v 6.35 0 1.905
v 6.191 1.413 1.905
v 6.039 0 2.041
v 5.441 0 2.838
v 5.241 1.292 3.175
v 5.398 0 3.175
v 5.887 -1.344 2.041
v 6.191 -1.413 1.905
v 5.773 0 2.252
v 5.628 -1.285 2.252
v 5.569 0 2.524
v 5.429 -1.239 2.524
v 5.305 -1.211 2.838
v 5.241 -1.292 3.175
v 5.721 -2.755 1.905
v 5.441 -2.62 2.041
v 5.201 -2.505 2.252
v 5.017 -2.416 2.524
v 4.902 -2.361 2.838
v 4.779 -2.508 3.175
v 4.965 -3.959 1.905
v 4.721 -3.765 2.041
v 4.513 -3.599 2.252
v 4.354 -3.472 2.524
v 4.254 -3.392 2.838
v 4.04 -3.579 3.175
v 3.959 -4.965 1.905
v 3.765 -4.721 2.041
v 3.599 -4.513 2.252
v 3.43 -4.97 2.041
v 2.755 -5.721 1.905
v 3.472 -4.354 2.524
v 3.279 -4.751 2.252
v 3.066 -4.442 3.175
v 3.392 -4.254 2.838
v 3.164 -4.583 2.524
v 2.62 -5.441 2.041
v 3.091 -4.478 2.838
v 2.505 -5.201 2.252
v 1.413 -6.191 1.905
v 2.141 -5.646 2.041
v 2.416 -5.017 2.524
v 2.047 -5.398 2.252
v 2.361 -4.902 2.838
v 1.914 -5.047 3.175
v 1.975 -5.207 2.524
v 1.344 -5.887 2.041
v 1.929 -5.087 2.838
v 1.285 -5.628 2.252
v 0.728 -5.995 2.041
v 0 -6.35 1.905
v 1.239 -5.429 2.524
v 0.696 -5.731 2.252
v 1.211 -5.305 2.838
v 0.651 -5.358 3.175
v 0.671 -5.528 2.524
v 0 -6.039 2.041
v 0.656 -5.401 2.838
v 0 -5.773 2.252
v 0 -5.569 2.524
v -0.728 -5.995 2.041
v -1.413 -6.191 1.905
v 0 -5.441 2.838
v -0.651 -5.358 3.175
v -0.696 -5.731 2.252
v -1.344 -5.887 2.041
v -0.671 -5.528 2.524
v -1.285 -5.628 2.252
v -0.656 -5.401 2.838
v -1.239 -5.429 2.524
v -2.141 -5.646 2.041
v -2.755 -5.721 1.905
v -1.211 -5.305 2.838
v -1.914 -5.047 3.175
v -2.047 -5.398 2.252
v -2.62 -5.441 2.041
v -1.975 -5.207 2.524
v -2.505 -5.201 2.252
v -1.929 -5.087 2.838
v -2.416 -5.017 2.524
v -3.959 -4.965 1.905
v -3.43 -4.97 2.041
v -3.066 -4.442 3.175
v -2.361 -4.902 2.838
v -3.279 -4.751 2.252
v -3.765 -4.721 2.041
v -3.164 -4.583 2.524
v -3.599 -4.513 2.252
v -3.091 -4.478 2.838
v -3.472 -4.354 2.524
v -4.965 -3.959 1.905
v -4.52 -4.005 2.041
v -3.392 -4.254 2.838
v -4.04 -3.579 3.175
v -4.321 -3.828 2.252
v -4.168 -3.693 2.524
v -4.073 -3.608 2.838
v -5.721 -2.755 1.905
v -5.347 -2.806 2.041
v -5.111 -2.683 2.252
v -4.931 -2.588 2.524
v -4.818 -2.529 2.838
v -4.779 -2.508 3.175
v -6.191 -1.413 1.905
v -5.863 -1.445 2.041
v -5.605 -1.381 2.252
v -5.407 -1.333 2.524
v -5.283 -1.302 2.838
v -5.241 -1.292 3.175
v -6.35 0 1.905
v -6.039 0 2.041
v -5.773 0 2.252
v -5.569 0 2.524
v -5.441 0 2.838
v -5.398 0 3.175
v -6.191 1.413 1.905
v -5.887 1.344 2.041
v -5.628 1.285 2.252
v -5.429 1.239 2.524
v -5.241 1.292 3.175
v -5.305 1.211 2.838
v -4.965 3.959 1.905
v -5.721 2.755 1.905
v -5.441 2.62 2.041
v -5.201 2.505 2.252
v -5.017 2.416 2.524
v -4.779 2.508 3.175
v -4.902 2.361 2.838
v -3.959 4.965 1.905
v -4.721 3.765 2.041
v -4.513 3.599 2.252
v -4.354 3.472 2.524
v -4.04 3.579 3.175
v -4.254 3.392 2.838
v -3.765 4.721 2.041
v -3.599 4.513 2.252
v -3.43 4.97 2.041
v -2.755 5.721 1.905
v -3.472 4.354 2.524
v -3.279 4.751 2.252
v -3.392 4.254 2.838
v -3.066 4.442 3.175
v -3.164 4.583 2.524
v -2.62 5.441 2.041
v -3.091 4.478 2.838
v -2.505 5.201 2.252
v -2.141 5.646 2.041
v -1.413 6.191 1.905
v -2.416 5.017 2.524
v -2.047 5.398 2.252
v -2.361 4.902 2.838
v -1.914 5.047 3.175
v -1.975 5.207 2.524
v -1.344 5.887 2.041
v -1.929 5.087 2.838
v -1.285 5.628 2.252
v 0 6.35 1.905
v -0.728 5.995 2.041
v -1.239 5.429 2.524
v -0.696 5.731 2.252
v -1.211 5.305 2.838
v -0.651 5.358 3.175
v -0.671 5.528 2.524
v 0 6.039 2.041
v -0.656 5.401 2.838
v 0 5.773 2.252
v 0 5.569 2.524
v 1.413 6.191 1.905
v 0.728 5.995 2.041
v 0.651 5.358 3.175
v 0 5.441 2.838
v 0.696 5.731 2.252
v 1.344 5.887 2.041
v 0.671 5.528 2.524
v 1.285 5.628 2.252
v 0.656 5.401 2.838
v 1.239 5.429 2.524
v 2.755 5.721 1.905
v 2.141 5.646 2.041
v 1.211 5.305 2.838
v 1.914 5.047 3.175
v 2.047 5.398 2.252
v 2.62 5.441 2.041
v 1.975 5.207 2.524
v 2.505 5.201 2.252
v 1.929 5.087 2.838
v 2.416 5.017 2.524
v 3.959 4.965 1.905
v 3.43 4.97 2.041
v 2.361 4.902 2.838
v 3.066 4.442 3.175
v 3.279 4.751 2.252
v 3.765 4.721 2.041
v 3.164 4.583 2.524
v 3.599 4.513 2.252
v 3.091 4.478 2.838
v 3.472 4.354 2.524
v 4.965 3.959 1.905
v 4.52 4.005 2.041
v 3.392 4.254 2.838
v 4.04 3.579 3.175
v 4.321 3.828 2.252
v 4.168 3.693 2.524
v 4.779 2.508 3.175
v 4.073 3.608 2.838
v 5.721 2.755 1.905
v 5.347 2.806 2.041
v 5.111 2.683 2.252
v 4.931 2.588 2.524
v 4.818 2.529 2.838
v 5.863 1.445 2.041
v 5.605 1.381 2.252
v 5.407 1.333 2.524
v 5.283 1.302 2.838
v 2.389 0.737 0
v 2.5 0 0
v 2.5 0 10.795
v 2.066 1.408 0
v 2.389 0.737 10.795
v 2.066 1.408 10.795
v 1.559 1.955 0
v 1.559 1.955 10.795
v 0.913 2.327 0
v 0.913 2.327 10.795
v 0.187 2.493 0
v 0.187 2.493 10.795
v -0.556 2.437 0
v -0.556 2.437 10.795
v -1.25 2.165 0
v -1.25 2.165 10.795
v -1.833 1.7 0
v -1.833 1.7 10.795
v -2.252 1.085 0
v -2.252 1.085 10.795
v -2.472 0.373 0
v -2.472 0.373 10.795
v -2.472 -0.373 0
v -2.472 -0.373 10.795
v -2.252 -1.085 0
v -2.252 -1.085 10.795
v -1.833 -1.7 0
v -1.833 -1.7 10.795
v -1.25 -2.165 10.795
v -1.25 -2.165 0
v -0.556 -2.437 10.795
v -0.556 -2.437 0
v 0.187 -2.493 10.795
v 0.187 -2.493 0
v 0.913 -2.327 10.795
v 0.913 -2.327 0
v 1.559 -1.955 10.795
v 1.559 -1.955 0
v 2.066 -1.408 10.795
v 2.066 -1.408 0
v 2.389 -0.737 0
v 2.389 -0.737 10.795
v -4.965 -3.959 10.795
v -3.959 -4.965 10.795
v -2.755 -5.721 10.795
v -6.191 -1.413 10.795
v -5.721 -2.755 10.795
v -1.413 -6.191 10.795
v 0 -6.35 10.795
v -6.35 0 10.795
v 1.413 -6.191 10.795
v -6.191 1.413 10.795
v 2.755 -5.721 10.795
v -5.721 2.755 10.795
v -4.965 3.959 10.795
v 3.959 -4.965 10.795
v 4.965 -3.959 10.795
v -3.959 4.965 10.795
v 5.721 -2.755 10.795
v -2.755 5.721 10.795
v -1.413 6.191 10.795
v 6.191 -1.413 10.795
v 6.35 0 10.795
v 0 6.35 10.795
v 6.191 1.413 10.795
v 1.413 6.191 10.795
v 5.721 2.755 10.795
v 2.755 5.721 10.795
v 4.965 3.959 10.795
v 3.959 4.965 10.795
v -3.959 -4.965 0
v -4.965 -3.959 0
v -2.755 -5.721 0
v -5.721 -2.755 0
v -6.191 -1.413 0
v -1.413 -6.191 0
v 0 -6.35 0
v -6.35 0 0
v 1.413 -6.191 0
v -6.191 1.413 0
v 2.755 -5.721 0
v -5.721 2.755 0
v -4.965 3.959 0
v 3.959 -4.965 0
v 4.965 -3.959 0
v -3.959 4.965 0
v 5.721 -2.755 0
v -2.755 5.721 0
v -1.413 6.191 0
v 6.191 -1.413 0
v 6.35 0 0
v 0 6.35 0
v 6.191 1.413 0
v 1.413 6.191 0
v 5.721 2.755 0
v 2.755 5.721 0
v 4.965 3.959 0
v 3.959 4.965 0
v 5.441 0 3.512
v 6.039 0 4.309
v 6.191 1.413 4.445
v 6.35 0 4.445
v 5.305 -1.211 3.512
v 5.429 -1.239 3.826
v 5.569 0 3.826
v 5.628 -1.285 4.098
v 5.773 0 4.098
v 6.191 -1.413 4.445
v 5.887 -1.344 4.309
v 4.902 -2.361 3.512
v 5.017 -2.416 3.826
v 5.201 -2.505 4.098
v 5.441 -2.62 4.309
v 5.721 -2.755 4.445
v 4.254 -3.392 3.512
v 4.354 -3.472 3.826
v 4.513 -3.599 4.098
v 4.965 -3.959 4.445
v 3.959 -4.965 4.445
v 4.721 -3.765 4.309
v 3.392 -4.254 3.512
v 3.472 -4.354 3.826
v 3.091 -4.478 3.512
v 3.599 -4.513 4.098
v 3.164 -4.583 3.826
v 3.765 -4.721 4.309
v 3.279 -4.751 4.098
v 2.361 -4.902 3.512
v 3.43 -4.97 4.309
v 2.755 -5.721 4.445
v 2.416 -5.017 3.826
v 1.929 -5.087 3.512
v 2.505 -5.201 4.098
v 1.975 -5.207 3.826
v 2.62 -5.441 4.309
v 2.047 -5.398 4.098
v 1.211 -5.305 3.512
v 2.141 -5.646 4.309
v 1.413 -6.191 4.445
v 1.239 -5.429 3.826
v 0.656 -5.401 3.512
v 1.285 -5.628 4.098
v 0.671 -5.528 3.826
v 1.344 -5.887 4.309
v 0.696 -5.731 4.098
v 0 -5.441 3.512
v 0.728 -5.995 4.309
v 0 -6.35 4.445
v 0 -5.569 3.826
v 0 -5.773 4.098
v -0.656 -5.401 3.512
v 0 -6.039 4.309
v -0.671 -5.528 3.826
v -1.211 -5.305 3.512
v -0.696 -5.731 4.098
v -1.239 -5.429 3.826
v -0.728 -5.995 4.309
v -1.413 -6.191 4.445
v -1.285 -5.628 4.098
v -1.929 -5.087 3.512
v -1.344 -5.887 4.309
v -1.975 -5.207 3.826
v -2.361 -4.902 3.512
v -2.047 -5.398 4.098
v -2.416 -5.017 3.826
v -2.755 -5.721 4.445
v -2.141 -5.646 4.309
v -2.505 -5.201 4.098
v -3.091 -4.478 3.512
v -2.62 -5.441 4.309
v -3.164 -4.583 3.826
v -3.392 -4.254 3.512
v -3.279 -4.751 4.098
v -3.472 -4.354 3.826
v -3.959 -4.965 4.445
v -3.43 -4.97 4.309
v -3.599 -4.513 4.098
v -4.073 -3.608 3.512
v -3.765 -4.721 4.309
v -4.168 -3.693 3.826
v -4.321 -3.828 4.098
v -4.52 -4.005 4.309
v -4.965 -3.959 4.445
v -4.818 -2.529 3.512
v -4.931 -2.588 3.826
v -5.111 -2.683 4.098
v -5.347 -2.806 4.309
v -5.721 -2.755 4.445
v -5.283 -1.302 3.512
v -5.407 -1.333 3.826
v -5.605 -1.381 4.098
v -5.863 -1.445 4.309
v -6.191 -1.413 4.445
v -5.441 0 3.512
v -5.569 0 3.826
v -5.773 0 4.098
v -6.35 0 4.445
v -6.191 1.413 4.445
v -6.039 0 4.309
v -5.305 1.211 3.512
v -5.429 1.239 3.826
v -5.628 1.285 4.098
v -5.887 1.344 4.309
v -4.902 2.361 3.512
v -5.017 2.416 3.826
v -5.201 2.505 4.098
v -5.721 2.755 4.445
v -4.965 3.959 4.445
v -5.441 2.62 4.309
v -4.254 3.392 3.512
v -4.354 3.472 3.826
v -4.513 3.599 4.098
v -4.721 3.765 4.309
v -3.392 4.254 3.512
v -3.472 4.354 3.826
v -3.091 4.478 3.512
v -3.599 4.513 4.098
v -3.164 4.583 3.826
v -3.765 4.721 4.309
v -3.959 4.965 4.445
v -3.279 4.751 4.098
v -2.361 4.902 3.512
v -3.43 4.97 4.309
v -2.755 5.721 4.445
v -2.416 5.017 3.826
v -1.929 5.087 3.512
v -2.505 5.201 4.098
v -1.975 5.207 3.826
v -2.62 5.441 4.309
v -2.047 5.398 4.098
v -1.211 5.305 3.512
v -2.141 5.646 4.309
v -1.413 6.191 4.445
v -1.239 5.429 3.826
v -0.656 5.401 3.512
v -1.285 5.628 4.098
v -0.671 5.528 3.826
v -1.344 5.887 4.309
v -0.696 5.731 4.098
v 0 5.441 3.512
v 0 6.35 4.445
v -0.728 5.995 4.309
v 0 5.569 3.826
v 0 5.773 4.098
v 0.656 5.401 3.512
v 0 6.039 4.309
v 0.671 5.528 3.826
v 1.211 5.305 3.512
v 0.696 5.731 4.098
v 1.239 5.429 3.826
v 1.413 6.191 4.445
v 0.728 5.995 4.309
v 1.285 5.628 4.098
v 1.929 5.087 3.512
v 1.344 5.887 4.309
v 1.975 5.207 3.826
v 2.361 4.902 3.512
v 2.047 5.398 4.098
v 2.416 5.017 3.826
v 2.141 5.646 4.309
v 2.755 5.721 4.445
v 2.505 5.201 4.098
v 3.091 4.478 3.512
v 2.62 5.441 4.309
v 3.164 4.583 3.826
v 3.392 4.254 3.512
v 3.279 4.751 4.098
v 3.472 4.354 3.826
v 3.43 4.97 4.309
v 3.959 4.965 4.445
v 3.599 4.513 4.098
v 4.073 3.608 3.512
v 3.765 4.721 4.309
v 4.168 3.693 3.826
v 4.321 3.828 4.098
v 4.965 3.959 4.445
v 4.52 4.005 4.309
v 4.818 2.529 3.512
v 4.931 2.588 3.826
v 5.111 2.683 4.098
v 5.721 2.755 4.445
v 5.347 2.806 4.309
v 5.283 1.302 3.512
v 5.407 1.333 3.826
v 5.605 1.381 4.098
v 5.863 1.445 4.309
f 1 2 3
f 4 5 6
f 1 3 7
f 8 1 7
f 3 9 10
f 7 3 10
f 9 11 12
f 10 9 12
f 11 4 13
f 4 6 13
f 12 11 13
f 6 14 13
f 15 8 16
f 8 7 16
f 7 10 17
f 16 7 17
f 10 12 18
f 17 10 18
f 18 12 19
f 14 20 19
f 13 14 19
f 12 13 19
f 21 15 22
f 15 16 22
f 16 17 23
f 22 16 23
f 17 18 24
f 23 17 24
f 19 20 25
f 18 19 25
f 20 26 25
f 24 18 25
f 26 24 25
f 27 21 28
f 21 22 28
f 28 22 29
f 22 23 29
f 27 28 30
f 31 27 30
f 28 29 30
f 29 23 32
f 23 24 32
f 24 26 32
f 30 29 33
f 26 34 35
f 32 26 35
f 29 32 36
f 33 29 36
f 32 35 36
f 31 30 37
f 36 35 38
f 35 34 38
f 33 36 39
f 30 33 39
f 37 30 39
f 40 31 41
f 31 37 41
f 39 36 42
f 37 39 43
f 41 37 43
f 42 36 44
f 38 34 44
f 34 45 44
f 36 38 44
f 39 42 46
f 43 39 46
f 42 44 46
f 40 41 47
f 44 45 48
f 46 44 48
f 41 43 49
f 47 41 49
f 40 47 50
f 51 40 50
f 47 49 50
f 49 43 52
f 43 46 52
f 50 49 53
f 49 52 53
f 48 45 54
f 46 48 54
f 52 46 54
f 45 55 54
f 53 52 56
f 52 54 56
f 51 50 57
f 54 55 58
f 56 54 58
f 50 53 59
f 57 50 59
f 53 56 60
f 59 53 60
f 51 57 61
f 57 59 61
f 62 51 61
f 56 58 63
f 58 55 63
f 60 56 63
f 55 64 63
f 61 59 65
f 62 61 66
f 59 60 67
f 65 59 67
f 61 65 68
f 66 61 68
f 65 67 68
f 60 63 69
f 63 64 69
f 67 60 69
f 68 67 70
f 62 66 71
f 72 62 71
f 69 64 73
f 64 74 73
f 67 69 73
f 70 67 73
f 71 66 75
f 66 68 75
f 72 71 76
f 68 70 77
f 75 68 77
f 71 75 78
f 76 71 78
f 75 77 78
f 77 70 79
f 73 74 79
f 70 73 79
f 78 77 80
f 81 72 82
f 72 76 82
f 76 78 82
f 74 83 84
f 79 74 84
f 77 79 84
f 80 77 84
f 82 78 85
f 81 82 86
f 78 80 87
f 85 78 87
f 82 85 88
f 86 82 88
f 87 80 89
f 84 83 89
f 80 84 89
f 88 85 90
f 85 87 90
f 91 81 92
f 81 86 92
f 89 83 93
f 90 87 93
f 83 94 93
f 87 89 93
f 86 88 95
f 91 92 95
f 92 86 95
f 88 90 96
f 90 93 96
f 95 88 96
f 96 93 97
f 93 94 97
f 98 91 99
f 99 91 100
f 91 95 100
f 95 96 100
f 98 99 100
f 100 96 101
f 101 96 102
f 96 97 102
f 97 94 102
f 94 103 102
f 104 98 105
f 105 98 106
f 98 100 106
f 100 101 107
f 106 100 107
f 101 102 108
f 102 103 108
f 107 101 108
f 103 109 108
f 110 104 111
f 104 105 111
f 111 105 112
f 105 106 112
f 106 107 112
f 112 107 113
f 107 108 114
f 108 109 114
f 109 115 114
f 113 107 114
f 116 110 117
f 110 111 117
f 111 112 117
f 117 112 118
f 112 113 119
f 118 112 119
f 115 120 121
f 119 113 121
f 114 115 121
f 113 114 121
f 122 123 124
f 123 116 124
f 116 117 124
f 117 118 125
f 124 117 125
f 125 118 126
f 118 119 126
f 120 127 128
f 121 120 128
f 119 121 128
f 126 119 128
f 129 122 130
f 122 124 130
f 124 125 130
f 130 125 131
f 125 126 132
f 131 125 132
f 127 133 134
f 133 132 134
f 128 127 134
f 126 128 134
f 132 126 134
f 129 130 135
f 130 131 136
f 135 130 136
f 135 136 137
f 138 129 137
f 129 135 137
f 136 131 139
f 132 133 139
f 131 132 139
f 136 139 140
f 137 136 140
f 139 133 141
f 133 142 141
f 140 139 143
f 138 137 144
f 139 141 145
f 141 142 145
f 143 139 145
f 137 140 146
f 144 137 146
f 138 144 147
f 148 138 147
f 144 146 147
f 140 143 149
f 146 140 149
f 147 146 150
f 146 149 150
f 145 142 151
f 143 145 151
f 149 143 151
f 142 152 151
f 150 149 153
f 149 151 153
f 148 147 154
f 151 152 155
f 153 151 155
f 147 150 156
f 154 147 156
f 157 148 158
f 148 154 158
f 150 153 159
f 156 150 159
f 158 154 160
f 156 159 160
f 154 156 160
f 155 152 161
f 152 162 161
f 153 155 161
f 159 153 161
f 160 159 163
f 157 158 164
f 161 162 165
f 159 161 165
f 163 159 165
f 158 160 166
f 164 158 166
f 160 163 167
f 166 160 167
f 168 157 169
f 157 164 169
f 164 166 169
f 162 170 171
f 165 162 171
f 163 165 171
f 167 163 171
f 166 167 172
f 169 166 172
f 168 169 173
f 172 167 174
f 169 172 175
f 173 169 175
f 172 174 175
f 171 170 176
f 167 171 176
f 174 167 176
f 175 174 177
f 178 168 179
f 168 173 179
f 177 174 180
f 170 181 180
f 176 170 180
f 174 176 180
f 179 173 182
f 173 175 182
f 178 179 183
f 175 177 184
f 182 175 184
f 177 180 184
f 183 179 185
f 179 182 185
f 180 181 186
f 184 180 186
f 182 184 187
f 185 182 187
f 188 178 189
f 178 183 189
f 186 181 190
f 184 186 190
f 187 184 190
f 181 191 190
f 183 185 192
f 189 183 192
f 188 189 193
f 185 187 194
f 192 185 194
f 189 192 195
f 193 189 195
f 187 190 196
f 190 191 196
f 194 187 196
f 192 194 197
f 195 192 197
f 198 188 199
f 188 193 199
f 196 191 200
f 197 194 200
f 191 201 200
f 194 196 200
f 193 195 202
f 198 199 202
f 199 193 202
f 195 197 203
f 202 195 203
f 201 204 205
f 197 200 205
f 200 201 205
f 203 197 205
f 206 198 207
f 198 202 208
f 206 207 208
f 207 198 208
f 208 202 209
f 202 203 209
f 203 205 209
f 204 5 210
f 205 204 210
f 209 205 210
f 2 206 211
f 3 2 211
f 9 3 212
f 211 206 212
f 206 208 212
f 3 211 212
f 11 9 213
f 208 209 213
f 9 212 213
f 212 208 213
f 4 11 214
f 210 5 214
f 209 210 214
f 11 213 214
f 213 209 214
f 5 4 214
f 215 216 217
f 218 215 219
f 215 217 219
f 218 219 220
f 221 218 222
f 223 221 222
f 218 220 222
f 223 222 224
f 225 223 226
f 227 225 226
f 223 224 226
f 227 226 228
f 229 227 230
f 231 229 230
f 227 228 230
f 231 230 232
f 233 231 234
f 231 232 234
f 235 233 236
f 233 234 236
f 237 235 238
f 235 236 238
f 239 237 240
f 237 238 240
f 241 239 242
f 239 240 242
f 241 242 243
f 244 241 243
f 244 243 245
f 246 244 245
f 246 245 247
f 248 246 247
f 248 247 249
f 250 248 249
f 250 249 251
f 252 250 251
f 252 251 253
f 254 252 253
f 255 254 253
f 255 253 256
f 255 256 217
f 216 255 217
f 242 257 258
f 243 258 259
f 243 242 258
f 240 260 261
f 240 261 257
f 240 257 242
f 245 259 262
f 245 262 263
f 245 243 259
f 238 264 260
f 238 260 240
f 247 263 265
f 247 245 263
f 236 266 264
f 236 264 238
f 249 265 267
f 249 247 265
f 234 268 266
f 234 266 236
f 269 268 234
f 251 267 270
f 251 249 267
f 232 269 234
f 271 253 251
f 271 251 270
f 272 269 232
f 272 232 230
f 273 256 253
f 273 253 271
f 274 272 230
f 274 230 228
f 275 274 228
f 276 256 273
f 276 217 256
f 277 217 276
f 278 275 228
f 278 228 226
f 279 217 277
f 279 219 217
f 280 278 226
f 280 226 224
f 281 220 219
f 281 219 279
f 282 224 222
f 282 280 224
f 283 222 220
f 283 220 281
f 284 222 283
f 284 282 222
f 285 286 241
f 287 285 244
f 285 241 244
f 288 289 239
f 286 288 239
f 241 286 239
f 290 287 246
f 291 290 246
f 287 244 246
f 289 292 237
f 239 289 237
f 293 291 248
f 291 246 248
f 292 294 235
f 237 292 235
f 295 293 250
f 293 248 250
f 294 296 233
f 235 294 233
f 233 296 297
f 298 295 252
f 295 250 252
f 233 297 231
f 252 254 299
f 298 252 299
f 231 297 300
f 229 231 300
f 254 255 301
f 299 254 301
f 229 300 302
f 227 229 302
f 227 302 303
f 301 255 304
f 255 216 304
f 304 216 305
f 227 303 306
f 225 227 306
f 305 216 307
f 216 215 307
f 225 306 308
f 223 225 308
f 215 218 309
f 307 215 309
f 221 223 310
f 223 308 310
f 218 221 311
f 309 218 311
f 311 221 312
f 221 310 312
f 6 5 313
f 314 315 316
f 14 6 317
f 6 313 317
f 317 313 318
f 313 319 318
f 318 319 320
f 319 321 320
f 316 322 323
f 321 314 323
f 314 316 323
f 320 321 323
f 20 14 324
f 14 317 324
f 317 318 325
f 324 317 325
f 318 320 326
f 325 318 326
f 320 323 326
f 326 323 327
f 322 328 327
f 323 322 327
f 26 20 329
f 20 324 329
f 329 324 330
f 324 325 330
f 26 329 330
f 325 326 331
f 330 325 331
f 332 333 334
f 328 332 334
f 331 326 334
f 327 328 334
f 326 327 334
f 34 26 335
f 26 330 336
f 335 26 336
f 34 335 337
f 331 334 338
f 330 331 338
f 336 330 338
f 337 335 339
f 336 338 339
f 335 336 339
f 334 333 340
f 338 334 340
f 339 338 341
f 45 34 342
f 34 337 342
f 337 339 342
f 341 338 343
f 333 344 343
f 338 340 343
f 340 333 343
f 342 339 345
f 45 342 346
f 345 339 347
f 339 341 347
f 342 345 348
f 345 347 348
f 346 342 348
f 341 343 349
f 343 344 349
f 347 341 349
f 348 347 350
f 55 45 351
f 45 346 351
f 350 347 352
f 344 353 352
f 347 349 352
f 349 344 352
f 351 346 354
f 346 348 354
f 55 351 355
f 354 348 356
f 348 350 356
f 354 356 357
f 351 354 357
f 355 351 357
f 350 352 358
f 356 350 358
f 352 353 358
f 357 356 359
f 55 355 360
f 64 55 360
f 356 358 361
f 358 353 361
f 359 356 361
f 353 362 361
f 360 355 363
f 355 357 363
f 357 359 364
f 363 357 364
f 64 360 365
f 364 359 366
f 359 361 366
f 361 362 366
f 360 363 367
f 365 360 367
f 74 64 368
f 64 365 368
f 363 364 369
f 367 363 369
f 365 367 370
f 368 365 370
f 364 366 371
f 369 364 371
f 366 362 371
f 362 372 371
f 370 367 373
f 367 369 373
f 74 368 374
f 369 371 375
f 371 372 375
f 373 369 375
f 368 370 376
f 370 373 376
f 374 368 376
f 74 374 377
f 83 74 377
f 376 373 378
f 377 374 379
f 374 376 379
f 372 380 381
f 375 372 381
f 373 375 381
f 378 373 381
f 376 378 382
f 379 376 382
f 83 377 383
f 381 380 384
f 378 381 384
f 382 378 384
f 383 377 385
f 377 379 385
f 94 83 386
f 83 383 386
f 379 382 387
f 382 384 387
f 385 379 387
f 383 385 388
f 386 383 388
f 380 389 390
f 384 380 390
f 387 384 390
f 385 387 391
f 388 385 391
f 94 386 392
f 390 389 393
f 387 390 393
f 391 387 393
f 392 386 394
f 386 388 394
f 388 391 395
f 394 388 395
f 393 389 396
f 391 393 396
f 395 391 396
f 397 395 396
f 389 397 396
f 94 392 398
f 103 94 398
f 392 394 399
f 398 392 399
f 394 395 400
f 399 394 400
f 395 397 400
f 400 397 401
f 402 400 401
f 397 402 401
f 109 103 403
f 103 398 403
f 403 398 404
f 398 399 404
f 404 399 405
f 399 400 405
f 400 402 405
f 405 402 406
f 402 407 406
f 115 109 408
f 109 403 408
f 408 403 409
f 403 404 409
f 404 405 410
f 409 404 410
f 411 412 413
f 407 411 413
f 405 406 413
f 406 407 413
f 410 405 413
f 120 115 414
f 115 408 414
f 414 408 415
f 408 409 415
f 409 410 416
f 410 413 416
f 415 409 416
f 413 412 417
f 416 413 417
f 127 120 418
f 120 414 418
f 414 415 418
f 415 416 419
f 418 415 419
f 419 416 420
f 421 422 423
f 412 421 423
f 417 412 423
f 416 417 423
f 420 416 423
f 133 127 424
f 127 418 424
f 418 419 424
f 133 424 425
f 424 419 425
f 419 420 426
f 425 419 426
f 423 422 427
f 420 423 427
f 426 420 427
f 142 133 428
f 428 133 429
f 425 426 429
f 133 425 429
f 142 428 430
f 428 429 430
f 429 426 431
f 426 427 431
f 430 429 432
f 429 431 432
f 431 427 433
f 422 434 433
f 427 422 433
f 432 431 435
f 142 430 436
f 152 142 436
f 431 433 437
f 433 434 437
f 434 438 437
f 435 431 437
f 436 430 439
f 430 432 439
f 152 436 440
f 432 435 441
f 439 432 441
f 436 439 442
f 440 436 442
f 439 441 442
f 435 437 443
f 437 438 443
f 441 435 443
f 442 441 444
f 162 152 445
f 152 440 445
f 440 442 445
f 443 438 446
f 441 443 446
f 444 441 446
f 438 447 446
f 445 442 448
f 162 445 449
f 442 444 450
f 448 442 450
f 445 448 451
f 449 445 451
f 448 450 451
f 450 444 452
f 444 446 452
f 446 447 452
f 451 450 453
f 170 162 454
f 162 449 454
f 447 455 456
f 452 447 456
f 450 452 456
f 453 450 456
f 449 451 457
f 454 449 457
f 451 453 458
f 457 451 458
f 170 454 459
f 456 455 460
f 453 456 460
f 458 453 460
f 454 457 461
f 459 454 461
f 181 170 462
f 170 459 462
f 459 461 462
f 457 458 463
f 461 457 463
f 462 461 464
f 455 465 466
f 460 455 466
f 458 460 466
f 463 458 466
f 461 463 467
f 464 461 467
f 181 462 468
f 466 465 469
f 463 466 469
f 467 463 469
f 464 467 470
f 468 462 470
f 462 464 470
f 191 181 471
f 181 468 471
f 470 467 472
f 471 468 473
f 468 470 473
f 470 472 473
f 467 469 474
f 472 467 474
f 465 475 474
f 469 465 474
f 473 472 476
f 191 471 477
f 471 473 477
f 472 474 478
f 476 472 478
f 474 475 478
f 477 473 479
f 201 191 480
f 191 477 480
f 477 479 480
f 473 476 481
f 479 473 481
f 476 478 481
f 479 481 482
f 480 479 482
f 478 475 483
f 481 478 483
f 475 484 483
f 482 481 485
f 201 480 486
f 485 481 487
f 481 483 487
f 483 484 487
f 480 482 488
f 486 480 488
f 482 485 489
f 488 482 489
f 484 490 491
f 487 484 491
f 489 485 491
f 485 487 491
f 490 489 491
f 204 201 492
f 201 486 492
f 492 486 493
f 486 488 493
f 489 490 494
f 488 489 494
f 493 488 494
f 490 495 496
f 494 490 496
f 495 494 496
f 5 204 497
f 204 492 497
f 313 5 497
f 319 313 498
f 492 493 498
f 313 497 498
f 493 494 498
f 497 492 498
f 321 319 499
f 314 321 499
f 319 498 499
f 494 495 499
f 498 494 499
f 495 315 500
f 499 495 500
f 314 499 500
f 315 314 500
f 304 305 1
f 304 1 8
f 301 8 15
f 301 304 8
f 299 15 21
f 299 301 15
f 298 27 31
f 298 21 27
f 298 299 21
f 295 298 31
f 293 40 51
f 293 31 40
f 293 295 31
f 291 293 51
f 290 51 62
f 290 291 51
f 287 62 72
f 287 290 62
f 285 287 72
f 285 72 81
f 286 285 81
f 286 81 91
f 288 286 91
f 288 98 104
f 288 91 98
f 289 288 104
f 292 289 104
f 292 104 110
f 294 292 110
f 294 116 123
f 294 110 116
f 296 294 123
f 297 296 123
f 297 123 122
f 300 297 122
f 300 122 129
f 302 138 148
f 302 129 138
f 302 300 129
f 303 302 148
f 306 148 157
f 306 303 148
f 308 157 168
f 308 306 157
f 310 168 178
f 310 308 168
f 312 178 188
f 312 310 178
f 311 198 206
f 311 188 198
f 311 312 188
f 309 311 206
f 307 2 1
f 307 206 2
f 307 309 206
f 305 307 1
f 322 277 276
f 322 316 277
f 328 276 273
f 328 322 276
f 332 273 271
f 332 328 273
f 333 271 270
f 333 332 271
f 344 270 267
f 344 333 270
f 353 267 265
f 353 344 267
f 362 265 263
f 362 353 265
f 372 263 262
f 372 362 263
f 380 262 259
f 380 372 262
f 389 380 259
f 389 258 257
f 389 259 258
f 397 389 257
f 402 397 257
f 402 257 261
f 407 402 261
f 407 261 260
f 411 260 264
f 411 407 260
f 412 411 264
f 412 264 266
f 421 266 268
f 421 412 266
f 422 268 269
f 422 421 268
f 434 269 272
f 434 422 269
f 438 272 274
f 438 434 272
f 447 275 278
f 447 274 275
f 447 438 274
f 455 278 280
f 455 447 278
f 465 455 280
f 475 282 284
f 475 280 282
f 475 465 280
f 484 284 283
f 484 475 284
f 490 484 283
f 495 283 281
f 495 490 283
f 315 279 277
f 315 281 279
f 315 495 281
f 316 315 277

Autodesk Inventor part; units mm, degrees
ref_plane "YZ Plane" through (0, 0, 0) normal (1, 0, 0) x (0, 1, 0)
ref_plane "XZ Plane" through (0, 0, 0) normal (0, 1, 0) x (-1, 0, 0)
ref_plane "XY Plane" through (0, 0, 0) normal (0, 0, 1) x (1, 0, 0)
sketch "Sketch1" plane through (0, 0, 0) normal (0, 1, 0) x (-1, 0, 0)
  line L0 (-2.5, 0) -> (-2.5, 10.795)
  line L1 (-2.5, 10.795) -> (-6.35, 10.795)
  line L2 (-6.35, 10.795) -> (-6.35, 4.445)
  arc A0 (-6.35, 1.905) -> (-6.35, 4.445) centre (-6.7204, 3.175) ccw
  line L3 (-6.35, 1.905) -> (-6.35, 0)
  line L4 (-6.35, 0) -> (-2.5, 0)
  line L5 (-6.7204, 3.175) -> (-5.3975, 3.175)
  line L6 (0, -2.159) -> (0, 12.954) projected
  point P0 (0, 0)
  dimension "d0" = 2.5
  dimension "d1" = 6.35
  dimension "d2" = 5.3975
  dimension "d3" = 10.795
  dimension "d4" = 7.62
  dimension "d5" = 2.54
revolve "Revolution1" add sketch "Sketch1" angle 360 about axis through (0, 0, -10) along (0, 0, 1)
properties part number "HOBBED PULLEY"
